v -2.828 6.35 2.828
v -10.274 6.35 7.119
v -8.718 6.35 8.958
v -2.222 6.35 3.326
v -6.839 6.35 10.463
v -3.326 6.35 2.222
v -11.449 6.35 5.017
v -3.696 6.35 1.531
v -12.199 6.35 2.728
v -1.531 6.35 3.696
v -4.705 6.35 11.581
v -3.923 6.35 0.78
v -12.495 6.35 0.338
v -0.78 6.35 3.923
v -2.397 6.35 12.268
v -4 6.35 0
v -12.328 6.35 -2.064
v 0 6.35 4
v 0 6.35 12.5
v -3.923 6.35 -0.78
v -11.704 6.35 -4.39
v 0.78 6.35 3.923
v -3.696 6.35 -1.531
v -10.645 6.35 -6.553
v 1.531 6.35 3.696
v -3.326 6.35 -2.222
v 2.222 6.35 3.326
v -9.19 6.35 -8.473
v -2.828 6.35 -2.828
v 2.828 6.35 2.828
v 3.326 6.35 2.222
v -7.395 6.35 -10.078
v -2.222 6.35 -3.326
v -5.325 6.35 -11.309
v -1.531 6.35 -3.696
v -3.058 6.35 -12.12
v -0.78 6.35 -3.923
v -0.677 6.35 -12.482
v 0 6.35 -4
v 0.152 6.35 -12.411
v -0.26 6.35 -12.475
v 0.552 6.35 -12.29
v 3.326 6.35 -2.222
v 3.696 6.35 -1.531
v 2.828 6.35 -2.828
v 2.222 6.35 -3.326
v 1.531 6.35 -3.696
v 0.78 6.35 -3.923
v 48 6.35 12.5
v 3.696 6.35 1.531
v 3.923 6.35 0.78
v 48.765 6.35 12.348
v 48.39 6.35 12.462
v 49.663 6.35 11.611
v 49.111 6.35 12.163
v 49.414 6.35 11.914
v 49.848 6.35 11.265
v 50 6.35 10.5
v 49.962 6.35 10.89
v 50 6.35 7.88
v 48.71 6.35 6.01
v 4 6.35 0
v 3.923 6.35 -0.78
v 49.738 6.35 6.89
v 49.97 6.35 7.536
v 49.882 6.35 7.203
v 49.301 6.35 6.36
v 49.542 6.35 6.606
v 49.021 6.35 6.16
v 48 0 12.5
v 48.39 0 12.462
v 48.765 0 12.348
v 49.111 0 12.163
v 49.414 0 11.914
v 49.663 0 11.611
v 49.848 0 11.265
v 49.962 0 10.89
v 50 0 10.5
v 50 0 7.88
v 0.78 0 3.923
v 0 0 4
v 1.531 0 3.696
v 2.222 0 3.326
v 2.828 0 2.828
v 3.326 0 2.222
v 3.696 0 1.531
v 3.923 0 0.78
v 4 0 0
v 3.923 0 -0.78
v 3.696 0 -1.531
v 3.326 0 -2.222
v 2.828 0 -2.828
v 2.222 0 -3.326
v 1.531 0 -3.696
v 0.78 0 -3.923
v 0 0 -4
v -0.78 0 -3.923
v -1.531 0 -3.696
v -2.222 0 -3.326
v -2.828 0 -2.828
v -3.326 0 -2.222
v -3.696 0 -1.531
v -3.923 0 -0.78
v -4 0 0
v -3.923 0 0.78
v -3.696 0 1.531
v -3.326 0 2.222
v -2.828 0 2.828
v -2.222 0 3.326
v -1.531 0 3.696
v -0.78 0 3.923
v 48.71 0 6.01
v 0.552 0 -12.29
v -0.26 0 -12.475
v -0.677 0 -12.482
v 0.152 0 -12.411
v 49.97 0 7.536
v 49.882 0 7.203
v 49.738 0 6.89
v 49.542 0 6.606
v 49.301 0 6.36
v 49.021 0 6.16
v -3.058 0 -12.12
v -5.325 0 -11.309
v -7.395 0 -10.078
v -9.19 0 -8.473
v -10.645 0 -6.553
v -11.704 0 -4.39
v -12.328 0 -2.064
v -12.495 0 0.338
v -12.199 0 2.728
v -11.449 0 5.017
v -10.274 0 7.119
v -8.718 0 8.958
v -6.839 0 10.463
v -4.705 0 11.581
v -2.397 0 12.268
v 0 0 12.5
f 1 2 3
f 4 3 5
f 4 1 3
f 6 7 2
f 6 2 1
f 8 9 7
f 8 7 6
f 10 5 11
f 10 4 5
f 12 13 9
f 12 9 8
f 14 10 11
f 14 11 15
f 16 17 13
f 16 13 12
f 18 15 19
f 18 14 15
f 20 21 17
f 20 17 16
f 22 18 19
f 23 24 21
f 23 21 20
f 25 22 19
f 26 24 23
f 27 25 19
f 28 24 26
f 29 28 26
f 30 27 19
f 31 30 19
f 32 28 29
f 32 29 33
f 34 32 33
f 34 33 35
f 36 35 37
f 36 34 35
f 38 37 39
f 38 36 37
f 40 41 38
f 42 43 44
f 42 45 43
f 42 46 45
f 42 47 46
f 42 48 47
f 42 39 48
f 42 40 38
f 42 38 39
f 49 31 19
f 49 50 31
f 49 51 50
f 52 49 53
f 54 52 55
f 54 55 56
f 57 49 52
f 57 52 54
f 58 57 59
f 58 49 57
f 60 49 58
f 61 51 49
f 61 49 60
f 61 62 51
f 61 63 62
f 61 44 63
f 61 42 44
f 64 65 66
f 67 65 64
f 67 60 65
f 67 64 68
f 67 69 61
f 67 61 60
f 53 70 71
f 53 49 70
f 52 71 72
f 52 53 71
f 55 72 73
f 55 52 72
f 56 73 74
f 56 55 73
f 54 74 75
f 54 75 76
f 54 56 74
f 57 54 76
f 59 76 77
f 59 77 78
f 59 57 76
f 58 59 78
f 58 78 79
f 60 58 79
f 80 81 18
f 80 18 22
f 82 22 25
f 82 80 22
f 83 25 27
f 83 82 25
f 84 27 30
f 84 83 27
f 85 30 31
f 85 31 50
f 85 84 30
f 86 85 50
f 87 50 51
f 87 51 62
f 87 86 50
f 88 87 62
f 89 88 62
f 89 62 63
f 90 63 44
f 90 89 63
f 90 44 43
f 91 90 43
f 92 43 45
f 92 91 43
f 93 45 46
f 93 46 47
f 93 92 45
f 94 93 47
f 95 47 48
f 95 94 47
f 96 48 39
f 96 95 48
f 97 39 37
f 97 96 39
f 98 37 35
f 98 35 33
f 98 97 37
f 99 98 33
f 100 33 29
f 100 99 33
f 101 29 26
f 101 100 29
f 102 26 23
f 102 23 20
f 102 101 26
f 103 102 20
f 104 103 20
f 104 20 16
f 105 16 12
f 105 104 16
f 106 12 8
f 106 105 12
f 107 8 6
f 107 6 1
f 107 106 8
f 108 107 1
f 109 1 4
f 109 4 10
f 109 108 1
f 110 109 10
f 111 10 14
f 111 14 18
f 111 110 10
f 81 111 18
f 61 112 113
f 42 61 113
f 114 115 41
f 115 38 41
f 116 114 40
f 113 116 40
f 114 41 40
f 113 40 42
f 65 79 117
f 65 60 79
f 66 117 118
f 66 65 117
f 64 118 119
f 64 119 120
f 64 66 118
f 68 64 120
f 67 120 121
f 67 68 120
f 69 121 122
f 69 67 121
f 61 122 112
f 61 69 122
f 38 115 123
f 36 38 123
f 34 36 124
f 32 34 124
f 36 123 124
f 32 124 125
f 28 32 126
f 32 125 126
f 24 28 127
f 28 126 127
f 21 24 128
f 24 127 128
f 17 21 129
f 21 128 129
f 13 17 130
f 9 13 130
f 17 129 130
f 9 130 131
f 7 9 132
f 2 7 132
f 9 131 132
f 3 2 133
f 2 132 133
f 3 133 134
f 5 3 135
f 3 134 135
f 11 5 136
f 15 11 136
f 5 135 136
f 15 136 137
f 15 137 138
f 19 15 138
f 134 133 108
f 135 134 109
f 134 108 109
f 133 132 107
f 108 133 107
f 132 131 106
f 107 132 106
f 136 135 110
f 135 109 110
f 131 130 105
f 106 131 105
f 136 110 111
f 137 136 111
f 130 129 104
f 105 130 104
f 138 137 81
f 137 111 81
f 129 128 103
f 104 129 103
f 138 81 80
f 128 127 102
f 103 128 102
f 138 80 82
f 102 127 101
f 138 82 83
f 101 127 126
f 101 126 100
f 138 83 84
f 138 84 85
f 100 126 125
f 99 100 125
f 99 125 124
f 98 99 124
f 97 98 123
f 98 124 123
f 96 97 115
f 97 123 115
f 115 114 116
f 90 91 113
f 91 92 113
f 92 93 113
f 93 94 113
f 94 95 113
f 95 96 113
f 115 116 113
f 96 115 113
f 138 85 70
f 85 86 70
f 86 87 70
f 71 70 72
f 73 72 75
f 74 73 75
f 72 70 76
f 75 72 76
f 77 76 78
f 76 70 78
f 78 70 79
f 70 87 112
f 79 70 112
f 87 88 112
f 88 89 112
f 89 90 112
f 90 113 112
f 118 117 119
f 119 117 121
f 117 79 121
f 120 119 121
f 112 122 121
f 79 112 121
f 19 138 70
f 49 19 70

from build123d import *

# Parameters (mm, degrees)
SKETCH1_R           = 4
BOSS_EXTRUDE1_DEPTH = 6.35
FILLET1_R           = 2
FILLET2_R           = 3


with BuildPart() as part:
    # Sketch1 → Boss-Extrude1 (new body)
    with BuildSketch(Plane(origin=(0, 0, 0), x_dir=(1, 0, 0), z_dir=(0, 1, 0))):
        with BuildLine():
            Line((0, -12.5), (50, -12.5))
            Line((50, -12.5), (50, -6.5))
            Line((50, -6.5), (0, 12.5))
            ThreePointArc((0, 12.5), (-12.5, 0), (0, -12.5))
        make_face()
        with Locations(Location((0, 0, 0), (0, 0, 270))):
            Circle(SKETCH1_R, mode=Mode.SUBTRACT)
    extrude(amount=BOSS_EXTRUDE1_DEPTH)

    # Fillet1
    fillet1_edges = [part.edges().sort_by_distance(p)[0] for p in [
        (50, 3.175, 6.5),
        (50, 3.175, 12.5),
    ]]
    fillet(fillet1_edges, radius=FILLET1_R)

    # Fillet2
    fillet2_edges = [part.edges().sort_by_distance(p)[0] for p in [
        (0, 3.175, -12.5),
    ]]
    fillet(fillet2_edges, radius=FILLET2_R)


solid = part.part
